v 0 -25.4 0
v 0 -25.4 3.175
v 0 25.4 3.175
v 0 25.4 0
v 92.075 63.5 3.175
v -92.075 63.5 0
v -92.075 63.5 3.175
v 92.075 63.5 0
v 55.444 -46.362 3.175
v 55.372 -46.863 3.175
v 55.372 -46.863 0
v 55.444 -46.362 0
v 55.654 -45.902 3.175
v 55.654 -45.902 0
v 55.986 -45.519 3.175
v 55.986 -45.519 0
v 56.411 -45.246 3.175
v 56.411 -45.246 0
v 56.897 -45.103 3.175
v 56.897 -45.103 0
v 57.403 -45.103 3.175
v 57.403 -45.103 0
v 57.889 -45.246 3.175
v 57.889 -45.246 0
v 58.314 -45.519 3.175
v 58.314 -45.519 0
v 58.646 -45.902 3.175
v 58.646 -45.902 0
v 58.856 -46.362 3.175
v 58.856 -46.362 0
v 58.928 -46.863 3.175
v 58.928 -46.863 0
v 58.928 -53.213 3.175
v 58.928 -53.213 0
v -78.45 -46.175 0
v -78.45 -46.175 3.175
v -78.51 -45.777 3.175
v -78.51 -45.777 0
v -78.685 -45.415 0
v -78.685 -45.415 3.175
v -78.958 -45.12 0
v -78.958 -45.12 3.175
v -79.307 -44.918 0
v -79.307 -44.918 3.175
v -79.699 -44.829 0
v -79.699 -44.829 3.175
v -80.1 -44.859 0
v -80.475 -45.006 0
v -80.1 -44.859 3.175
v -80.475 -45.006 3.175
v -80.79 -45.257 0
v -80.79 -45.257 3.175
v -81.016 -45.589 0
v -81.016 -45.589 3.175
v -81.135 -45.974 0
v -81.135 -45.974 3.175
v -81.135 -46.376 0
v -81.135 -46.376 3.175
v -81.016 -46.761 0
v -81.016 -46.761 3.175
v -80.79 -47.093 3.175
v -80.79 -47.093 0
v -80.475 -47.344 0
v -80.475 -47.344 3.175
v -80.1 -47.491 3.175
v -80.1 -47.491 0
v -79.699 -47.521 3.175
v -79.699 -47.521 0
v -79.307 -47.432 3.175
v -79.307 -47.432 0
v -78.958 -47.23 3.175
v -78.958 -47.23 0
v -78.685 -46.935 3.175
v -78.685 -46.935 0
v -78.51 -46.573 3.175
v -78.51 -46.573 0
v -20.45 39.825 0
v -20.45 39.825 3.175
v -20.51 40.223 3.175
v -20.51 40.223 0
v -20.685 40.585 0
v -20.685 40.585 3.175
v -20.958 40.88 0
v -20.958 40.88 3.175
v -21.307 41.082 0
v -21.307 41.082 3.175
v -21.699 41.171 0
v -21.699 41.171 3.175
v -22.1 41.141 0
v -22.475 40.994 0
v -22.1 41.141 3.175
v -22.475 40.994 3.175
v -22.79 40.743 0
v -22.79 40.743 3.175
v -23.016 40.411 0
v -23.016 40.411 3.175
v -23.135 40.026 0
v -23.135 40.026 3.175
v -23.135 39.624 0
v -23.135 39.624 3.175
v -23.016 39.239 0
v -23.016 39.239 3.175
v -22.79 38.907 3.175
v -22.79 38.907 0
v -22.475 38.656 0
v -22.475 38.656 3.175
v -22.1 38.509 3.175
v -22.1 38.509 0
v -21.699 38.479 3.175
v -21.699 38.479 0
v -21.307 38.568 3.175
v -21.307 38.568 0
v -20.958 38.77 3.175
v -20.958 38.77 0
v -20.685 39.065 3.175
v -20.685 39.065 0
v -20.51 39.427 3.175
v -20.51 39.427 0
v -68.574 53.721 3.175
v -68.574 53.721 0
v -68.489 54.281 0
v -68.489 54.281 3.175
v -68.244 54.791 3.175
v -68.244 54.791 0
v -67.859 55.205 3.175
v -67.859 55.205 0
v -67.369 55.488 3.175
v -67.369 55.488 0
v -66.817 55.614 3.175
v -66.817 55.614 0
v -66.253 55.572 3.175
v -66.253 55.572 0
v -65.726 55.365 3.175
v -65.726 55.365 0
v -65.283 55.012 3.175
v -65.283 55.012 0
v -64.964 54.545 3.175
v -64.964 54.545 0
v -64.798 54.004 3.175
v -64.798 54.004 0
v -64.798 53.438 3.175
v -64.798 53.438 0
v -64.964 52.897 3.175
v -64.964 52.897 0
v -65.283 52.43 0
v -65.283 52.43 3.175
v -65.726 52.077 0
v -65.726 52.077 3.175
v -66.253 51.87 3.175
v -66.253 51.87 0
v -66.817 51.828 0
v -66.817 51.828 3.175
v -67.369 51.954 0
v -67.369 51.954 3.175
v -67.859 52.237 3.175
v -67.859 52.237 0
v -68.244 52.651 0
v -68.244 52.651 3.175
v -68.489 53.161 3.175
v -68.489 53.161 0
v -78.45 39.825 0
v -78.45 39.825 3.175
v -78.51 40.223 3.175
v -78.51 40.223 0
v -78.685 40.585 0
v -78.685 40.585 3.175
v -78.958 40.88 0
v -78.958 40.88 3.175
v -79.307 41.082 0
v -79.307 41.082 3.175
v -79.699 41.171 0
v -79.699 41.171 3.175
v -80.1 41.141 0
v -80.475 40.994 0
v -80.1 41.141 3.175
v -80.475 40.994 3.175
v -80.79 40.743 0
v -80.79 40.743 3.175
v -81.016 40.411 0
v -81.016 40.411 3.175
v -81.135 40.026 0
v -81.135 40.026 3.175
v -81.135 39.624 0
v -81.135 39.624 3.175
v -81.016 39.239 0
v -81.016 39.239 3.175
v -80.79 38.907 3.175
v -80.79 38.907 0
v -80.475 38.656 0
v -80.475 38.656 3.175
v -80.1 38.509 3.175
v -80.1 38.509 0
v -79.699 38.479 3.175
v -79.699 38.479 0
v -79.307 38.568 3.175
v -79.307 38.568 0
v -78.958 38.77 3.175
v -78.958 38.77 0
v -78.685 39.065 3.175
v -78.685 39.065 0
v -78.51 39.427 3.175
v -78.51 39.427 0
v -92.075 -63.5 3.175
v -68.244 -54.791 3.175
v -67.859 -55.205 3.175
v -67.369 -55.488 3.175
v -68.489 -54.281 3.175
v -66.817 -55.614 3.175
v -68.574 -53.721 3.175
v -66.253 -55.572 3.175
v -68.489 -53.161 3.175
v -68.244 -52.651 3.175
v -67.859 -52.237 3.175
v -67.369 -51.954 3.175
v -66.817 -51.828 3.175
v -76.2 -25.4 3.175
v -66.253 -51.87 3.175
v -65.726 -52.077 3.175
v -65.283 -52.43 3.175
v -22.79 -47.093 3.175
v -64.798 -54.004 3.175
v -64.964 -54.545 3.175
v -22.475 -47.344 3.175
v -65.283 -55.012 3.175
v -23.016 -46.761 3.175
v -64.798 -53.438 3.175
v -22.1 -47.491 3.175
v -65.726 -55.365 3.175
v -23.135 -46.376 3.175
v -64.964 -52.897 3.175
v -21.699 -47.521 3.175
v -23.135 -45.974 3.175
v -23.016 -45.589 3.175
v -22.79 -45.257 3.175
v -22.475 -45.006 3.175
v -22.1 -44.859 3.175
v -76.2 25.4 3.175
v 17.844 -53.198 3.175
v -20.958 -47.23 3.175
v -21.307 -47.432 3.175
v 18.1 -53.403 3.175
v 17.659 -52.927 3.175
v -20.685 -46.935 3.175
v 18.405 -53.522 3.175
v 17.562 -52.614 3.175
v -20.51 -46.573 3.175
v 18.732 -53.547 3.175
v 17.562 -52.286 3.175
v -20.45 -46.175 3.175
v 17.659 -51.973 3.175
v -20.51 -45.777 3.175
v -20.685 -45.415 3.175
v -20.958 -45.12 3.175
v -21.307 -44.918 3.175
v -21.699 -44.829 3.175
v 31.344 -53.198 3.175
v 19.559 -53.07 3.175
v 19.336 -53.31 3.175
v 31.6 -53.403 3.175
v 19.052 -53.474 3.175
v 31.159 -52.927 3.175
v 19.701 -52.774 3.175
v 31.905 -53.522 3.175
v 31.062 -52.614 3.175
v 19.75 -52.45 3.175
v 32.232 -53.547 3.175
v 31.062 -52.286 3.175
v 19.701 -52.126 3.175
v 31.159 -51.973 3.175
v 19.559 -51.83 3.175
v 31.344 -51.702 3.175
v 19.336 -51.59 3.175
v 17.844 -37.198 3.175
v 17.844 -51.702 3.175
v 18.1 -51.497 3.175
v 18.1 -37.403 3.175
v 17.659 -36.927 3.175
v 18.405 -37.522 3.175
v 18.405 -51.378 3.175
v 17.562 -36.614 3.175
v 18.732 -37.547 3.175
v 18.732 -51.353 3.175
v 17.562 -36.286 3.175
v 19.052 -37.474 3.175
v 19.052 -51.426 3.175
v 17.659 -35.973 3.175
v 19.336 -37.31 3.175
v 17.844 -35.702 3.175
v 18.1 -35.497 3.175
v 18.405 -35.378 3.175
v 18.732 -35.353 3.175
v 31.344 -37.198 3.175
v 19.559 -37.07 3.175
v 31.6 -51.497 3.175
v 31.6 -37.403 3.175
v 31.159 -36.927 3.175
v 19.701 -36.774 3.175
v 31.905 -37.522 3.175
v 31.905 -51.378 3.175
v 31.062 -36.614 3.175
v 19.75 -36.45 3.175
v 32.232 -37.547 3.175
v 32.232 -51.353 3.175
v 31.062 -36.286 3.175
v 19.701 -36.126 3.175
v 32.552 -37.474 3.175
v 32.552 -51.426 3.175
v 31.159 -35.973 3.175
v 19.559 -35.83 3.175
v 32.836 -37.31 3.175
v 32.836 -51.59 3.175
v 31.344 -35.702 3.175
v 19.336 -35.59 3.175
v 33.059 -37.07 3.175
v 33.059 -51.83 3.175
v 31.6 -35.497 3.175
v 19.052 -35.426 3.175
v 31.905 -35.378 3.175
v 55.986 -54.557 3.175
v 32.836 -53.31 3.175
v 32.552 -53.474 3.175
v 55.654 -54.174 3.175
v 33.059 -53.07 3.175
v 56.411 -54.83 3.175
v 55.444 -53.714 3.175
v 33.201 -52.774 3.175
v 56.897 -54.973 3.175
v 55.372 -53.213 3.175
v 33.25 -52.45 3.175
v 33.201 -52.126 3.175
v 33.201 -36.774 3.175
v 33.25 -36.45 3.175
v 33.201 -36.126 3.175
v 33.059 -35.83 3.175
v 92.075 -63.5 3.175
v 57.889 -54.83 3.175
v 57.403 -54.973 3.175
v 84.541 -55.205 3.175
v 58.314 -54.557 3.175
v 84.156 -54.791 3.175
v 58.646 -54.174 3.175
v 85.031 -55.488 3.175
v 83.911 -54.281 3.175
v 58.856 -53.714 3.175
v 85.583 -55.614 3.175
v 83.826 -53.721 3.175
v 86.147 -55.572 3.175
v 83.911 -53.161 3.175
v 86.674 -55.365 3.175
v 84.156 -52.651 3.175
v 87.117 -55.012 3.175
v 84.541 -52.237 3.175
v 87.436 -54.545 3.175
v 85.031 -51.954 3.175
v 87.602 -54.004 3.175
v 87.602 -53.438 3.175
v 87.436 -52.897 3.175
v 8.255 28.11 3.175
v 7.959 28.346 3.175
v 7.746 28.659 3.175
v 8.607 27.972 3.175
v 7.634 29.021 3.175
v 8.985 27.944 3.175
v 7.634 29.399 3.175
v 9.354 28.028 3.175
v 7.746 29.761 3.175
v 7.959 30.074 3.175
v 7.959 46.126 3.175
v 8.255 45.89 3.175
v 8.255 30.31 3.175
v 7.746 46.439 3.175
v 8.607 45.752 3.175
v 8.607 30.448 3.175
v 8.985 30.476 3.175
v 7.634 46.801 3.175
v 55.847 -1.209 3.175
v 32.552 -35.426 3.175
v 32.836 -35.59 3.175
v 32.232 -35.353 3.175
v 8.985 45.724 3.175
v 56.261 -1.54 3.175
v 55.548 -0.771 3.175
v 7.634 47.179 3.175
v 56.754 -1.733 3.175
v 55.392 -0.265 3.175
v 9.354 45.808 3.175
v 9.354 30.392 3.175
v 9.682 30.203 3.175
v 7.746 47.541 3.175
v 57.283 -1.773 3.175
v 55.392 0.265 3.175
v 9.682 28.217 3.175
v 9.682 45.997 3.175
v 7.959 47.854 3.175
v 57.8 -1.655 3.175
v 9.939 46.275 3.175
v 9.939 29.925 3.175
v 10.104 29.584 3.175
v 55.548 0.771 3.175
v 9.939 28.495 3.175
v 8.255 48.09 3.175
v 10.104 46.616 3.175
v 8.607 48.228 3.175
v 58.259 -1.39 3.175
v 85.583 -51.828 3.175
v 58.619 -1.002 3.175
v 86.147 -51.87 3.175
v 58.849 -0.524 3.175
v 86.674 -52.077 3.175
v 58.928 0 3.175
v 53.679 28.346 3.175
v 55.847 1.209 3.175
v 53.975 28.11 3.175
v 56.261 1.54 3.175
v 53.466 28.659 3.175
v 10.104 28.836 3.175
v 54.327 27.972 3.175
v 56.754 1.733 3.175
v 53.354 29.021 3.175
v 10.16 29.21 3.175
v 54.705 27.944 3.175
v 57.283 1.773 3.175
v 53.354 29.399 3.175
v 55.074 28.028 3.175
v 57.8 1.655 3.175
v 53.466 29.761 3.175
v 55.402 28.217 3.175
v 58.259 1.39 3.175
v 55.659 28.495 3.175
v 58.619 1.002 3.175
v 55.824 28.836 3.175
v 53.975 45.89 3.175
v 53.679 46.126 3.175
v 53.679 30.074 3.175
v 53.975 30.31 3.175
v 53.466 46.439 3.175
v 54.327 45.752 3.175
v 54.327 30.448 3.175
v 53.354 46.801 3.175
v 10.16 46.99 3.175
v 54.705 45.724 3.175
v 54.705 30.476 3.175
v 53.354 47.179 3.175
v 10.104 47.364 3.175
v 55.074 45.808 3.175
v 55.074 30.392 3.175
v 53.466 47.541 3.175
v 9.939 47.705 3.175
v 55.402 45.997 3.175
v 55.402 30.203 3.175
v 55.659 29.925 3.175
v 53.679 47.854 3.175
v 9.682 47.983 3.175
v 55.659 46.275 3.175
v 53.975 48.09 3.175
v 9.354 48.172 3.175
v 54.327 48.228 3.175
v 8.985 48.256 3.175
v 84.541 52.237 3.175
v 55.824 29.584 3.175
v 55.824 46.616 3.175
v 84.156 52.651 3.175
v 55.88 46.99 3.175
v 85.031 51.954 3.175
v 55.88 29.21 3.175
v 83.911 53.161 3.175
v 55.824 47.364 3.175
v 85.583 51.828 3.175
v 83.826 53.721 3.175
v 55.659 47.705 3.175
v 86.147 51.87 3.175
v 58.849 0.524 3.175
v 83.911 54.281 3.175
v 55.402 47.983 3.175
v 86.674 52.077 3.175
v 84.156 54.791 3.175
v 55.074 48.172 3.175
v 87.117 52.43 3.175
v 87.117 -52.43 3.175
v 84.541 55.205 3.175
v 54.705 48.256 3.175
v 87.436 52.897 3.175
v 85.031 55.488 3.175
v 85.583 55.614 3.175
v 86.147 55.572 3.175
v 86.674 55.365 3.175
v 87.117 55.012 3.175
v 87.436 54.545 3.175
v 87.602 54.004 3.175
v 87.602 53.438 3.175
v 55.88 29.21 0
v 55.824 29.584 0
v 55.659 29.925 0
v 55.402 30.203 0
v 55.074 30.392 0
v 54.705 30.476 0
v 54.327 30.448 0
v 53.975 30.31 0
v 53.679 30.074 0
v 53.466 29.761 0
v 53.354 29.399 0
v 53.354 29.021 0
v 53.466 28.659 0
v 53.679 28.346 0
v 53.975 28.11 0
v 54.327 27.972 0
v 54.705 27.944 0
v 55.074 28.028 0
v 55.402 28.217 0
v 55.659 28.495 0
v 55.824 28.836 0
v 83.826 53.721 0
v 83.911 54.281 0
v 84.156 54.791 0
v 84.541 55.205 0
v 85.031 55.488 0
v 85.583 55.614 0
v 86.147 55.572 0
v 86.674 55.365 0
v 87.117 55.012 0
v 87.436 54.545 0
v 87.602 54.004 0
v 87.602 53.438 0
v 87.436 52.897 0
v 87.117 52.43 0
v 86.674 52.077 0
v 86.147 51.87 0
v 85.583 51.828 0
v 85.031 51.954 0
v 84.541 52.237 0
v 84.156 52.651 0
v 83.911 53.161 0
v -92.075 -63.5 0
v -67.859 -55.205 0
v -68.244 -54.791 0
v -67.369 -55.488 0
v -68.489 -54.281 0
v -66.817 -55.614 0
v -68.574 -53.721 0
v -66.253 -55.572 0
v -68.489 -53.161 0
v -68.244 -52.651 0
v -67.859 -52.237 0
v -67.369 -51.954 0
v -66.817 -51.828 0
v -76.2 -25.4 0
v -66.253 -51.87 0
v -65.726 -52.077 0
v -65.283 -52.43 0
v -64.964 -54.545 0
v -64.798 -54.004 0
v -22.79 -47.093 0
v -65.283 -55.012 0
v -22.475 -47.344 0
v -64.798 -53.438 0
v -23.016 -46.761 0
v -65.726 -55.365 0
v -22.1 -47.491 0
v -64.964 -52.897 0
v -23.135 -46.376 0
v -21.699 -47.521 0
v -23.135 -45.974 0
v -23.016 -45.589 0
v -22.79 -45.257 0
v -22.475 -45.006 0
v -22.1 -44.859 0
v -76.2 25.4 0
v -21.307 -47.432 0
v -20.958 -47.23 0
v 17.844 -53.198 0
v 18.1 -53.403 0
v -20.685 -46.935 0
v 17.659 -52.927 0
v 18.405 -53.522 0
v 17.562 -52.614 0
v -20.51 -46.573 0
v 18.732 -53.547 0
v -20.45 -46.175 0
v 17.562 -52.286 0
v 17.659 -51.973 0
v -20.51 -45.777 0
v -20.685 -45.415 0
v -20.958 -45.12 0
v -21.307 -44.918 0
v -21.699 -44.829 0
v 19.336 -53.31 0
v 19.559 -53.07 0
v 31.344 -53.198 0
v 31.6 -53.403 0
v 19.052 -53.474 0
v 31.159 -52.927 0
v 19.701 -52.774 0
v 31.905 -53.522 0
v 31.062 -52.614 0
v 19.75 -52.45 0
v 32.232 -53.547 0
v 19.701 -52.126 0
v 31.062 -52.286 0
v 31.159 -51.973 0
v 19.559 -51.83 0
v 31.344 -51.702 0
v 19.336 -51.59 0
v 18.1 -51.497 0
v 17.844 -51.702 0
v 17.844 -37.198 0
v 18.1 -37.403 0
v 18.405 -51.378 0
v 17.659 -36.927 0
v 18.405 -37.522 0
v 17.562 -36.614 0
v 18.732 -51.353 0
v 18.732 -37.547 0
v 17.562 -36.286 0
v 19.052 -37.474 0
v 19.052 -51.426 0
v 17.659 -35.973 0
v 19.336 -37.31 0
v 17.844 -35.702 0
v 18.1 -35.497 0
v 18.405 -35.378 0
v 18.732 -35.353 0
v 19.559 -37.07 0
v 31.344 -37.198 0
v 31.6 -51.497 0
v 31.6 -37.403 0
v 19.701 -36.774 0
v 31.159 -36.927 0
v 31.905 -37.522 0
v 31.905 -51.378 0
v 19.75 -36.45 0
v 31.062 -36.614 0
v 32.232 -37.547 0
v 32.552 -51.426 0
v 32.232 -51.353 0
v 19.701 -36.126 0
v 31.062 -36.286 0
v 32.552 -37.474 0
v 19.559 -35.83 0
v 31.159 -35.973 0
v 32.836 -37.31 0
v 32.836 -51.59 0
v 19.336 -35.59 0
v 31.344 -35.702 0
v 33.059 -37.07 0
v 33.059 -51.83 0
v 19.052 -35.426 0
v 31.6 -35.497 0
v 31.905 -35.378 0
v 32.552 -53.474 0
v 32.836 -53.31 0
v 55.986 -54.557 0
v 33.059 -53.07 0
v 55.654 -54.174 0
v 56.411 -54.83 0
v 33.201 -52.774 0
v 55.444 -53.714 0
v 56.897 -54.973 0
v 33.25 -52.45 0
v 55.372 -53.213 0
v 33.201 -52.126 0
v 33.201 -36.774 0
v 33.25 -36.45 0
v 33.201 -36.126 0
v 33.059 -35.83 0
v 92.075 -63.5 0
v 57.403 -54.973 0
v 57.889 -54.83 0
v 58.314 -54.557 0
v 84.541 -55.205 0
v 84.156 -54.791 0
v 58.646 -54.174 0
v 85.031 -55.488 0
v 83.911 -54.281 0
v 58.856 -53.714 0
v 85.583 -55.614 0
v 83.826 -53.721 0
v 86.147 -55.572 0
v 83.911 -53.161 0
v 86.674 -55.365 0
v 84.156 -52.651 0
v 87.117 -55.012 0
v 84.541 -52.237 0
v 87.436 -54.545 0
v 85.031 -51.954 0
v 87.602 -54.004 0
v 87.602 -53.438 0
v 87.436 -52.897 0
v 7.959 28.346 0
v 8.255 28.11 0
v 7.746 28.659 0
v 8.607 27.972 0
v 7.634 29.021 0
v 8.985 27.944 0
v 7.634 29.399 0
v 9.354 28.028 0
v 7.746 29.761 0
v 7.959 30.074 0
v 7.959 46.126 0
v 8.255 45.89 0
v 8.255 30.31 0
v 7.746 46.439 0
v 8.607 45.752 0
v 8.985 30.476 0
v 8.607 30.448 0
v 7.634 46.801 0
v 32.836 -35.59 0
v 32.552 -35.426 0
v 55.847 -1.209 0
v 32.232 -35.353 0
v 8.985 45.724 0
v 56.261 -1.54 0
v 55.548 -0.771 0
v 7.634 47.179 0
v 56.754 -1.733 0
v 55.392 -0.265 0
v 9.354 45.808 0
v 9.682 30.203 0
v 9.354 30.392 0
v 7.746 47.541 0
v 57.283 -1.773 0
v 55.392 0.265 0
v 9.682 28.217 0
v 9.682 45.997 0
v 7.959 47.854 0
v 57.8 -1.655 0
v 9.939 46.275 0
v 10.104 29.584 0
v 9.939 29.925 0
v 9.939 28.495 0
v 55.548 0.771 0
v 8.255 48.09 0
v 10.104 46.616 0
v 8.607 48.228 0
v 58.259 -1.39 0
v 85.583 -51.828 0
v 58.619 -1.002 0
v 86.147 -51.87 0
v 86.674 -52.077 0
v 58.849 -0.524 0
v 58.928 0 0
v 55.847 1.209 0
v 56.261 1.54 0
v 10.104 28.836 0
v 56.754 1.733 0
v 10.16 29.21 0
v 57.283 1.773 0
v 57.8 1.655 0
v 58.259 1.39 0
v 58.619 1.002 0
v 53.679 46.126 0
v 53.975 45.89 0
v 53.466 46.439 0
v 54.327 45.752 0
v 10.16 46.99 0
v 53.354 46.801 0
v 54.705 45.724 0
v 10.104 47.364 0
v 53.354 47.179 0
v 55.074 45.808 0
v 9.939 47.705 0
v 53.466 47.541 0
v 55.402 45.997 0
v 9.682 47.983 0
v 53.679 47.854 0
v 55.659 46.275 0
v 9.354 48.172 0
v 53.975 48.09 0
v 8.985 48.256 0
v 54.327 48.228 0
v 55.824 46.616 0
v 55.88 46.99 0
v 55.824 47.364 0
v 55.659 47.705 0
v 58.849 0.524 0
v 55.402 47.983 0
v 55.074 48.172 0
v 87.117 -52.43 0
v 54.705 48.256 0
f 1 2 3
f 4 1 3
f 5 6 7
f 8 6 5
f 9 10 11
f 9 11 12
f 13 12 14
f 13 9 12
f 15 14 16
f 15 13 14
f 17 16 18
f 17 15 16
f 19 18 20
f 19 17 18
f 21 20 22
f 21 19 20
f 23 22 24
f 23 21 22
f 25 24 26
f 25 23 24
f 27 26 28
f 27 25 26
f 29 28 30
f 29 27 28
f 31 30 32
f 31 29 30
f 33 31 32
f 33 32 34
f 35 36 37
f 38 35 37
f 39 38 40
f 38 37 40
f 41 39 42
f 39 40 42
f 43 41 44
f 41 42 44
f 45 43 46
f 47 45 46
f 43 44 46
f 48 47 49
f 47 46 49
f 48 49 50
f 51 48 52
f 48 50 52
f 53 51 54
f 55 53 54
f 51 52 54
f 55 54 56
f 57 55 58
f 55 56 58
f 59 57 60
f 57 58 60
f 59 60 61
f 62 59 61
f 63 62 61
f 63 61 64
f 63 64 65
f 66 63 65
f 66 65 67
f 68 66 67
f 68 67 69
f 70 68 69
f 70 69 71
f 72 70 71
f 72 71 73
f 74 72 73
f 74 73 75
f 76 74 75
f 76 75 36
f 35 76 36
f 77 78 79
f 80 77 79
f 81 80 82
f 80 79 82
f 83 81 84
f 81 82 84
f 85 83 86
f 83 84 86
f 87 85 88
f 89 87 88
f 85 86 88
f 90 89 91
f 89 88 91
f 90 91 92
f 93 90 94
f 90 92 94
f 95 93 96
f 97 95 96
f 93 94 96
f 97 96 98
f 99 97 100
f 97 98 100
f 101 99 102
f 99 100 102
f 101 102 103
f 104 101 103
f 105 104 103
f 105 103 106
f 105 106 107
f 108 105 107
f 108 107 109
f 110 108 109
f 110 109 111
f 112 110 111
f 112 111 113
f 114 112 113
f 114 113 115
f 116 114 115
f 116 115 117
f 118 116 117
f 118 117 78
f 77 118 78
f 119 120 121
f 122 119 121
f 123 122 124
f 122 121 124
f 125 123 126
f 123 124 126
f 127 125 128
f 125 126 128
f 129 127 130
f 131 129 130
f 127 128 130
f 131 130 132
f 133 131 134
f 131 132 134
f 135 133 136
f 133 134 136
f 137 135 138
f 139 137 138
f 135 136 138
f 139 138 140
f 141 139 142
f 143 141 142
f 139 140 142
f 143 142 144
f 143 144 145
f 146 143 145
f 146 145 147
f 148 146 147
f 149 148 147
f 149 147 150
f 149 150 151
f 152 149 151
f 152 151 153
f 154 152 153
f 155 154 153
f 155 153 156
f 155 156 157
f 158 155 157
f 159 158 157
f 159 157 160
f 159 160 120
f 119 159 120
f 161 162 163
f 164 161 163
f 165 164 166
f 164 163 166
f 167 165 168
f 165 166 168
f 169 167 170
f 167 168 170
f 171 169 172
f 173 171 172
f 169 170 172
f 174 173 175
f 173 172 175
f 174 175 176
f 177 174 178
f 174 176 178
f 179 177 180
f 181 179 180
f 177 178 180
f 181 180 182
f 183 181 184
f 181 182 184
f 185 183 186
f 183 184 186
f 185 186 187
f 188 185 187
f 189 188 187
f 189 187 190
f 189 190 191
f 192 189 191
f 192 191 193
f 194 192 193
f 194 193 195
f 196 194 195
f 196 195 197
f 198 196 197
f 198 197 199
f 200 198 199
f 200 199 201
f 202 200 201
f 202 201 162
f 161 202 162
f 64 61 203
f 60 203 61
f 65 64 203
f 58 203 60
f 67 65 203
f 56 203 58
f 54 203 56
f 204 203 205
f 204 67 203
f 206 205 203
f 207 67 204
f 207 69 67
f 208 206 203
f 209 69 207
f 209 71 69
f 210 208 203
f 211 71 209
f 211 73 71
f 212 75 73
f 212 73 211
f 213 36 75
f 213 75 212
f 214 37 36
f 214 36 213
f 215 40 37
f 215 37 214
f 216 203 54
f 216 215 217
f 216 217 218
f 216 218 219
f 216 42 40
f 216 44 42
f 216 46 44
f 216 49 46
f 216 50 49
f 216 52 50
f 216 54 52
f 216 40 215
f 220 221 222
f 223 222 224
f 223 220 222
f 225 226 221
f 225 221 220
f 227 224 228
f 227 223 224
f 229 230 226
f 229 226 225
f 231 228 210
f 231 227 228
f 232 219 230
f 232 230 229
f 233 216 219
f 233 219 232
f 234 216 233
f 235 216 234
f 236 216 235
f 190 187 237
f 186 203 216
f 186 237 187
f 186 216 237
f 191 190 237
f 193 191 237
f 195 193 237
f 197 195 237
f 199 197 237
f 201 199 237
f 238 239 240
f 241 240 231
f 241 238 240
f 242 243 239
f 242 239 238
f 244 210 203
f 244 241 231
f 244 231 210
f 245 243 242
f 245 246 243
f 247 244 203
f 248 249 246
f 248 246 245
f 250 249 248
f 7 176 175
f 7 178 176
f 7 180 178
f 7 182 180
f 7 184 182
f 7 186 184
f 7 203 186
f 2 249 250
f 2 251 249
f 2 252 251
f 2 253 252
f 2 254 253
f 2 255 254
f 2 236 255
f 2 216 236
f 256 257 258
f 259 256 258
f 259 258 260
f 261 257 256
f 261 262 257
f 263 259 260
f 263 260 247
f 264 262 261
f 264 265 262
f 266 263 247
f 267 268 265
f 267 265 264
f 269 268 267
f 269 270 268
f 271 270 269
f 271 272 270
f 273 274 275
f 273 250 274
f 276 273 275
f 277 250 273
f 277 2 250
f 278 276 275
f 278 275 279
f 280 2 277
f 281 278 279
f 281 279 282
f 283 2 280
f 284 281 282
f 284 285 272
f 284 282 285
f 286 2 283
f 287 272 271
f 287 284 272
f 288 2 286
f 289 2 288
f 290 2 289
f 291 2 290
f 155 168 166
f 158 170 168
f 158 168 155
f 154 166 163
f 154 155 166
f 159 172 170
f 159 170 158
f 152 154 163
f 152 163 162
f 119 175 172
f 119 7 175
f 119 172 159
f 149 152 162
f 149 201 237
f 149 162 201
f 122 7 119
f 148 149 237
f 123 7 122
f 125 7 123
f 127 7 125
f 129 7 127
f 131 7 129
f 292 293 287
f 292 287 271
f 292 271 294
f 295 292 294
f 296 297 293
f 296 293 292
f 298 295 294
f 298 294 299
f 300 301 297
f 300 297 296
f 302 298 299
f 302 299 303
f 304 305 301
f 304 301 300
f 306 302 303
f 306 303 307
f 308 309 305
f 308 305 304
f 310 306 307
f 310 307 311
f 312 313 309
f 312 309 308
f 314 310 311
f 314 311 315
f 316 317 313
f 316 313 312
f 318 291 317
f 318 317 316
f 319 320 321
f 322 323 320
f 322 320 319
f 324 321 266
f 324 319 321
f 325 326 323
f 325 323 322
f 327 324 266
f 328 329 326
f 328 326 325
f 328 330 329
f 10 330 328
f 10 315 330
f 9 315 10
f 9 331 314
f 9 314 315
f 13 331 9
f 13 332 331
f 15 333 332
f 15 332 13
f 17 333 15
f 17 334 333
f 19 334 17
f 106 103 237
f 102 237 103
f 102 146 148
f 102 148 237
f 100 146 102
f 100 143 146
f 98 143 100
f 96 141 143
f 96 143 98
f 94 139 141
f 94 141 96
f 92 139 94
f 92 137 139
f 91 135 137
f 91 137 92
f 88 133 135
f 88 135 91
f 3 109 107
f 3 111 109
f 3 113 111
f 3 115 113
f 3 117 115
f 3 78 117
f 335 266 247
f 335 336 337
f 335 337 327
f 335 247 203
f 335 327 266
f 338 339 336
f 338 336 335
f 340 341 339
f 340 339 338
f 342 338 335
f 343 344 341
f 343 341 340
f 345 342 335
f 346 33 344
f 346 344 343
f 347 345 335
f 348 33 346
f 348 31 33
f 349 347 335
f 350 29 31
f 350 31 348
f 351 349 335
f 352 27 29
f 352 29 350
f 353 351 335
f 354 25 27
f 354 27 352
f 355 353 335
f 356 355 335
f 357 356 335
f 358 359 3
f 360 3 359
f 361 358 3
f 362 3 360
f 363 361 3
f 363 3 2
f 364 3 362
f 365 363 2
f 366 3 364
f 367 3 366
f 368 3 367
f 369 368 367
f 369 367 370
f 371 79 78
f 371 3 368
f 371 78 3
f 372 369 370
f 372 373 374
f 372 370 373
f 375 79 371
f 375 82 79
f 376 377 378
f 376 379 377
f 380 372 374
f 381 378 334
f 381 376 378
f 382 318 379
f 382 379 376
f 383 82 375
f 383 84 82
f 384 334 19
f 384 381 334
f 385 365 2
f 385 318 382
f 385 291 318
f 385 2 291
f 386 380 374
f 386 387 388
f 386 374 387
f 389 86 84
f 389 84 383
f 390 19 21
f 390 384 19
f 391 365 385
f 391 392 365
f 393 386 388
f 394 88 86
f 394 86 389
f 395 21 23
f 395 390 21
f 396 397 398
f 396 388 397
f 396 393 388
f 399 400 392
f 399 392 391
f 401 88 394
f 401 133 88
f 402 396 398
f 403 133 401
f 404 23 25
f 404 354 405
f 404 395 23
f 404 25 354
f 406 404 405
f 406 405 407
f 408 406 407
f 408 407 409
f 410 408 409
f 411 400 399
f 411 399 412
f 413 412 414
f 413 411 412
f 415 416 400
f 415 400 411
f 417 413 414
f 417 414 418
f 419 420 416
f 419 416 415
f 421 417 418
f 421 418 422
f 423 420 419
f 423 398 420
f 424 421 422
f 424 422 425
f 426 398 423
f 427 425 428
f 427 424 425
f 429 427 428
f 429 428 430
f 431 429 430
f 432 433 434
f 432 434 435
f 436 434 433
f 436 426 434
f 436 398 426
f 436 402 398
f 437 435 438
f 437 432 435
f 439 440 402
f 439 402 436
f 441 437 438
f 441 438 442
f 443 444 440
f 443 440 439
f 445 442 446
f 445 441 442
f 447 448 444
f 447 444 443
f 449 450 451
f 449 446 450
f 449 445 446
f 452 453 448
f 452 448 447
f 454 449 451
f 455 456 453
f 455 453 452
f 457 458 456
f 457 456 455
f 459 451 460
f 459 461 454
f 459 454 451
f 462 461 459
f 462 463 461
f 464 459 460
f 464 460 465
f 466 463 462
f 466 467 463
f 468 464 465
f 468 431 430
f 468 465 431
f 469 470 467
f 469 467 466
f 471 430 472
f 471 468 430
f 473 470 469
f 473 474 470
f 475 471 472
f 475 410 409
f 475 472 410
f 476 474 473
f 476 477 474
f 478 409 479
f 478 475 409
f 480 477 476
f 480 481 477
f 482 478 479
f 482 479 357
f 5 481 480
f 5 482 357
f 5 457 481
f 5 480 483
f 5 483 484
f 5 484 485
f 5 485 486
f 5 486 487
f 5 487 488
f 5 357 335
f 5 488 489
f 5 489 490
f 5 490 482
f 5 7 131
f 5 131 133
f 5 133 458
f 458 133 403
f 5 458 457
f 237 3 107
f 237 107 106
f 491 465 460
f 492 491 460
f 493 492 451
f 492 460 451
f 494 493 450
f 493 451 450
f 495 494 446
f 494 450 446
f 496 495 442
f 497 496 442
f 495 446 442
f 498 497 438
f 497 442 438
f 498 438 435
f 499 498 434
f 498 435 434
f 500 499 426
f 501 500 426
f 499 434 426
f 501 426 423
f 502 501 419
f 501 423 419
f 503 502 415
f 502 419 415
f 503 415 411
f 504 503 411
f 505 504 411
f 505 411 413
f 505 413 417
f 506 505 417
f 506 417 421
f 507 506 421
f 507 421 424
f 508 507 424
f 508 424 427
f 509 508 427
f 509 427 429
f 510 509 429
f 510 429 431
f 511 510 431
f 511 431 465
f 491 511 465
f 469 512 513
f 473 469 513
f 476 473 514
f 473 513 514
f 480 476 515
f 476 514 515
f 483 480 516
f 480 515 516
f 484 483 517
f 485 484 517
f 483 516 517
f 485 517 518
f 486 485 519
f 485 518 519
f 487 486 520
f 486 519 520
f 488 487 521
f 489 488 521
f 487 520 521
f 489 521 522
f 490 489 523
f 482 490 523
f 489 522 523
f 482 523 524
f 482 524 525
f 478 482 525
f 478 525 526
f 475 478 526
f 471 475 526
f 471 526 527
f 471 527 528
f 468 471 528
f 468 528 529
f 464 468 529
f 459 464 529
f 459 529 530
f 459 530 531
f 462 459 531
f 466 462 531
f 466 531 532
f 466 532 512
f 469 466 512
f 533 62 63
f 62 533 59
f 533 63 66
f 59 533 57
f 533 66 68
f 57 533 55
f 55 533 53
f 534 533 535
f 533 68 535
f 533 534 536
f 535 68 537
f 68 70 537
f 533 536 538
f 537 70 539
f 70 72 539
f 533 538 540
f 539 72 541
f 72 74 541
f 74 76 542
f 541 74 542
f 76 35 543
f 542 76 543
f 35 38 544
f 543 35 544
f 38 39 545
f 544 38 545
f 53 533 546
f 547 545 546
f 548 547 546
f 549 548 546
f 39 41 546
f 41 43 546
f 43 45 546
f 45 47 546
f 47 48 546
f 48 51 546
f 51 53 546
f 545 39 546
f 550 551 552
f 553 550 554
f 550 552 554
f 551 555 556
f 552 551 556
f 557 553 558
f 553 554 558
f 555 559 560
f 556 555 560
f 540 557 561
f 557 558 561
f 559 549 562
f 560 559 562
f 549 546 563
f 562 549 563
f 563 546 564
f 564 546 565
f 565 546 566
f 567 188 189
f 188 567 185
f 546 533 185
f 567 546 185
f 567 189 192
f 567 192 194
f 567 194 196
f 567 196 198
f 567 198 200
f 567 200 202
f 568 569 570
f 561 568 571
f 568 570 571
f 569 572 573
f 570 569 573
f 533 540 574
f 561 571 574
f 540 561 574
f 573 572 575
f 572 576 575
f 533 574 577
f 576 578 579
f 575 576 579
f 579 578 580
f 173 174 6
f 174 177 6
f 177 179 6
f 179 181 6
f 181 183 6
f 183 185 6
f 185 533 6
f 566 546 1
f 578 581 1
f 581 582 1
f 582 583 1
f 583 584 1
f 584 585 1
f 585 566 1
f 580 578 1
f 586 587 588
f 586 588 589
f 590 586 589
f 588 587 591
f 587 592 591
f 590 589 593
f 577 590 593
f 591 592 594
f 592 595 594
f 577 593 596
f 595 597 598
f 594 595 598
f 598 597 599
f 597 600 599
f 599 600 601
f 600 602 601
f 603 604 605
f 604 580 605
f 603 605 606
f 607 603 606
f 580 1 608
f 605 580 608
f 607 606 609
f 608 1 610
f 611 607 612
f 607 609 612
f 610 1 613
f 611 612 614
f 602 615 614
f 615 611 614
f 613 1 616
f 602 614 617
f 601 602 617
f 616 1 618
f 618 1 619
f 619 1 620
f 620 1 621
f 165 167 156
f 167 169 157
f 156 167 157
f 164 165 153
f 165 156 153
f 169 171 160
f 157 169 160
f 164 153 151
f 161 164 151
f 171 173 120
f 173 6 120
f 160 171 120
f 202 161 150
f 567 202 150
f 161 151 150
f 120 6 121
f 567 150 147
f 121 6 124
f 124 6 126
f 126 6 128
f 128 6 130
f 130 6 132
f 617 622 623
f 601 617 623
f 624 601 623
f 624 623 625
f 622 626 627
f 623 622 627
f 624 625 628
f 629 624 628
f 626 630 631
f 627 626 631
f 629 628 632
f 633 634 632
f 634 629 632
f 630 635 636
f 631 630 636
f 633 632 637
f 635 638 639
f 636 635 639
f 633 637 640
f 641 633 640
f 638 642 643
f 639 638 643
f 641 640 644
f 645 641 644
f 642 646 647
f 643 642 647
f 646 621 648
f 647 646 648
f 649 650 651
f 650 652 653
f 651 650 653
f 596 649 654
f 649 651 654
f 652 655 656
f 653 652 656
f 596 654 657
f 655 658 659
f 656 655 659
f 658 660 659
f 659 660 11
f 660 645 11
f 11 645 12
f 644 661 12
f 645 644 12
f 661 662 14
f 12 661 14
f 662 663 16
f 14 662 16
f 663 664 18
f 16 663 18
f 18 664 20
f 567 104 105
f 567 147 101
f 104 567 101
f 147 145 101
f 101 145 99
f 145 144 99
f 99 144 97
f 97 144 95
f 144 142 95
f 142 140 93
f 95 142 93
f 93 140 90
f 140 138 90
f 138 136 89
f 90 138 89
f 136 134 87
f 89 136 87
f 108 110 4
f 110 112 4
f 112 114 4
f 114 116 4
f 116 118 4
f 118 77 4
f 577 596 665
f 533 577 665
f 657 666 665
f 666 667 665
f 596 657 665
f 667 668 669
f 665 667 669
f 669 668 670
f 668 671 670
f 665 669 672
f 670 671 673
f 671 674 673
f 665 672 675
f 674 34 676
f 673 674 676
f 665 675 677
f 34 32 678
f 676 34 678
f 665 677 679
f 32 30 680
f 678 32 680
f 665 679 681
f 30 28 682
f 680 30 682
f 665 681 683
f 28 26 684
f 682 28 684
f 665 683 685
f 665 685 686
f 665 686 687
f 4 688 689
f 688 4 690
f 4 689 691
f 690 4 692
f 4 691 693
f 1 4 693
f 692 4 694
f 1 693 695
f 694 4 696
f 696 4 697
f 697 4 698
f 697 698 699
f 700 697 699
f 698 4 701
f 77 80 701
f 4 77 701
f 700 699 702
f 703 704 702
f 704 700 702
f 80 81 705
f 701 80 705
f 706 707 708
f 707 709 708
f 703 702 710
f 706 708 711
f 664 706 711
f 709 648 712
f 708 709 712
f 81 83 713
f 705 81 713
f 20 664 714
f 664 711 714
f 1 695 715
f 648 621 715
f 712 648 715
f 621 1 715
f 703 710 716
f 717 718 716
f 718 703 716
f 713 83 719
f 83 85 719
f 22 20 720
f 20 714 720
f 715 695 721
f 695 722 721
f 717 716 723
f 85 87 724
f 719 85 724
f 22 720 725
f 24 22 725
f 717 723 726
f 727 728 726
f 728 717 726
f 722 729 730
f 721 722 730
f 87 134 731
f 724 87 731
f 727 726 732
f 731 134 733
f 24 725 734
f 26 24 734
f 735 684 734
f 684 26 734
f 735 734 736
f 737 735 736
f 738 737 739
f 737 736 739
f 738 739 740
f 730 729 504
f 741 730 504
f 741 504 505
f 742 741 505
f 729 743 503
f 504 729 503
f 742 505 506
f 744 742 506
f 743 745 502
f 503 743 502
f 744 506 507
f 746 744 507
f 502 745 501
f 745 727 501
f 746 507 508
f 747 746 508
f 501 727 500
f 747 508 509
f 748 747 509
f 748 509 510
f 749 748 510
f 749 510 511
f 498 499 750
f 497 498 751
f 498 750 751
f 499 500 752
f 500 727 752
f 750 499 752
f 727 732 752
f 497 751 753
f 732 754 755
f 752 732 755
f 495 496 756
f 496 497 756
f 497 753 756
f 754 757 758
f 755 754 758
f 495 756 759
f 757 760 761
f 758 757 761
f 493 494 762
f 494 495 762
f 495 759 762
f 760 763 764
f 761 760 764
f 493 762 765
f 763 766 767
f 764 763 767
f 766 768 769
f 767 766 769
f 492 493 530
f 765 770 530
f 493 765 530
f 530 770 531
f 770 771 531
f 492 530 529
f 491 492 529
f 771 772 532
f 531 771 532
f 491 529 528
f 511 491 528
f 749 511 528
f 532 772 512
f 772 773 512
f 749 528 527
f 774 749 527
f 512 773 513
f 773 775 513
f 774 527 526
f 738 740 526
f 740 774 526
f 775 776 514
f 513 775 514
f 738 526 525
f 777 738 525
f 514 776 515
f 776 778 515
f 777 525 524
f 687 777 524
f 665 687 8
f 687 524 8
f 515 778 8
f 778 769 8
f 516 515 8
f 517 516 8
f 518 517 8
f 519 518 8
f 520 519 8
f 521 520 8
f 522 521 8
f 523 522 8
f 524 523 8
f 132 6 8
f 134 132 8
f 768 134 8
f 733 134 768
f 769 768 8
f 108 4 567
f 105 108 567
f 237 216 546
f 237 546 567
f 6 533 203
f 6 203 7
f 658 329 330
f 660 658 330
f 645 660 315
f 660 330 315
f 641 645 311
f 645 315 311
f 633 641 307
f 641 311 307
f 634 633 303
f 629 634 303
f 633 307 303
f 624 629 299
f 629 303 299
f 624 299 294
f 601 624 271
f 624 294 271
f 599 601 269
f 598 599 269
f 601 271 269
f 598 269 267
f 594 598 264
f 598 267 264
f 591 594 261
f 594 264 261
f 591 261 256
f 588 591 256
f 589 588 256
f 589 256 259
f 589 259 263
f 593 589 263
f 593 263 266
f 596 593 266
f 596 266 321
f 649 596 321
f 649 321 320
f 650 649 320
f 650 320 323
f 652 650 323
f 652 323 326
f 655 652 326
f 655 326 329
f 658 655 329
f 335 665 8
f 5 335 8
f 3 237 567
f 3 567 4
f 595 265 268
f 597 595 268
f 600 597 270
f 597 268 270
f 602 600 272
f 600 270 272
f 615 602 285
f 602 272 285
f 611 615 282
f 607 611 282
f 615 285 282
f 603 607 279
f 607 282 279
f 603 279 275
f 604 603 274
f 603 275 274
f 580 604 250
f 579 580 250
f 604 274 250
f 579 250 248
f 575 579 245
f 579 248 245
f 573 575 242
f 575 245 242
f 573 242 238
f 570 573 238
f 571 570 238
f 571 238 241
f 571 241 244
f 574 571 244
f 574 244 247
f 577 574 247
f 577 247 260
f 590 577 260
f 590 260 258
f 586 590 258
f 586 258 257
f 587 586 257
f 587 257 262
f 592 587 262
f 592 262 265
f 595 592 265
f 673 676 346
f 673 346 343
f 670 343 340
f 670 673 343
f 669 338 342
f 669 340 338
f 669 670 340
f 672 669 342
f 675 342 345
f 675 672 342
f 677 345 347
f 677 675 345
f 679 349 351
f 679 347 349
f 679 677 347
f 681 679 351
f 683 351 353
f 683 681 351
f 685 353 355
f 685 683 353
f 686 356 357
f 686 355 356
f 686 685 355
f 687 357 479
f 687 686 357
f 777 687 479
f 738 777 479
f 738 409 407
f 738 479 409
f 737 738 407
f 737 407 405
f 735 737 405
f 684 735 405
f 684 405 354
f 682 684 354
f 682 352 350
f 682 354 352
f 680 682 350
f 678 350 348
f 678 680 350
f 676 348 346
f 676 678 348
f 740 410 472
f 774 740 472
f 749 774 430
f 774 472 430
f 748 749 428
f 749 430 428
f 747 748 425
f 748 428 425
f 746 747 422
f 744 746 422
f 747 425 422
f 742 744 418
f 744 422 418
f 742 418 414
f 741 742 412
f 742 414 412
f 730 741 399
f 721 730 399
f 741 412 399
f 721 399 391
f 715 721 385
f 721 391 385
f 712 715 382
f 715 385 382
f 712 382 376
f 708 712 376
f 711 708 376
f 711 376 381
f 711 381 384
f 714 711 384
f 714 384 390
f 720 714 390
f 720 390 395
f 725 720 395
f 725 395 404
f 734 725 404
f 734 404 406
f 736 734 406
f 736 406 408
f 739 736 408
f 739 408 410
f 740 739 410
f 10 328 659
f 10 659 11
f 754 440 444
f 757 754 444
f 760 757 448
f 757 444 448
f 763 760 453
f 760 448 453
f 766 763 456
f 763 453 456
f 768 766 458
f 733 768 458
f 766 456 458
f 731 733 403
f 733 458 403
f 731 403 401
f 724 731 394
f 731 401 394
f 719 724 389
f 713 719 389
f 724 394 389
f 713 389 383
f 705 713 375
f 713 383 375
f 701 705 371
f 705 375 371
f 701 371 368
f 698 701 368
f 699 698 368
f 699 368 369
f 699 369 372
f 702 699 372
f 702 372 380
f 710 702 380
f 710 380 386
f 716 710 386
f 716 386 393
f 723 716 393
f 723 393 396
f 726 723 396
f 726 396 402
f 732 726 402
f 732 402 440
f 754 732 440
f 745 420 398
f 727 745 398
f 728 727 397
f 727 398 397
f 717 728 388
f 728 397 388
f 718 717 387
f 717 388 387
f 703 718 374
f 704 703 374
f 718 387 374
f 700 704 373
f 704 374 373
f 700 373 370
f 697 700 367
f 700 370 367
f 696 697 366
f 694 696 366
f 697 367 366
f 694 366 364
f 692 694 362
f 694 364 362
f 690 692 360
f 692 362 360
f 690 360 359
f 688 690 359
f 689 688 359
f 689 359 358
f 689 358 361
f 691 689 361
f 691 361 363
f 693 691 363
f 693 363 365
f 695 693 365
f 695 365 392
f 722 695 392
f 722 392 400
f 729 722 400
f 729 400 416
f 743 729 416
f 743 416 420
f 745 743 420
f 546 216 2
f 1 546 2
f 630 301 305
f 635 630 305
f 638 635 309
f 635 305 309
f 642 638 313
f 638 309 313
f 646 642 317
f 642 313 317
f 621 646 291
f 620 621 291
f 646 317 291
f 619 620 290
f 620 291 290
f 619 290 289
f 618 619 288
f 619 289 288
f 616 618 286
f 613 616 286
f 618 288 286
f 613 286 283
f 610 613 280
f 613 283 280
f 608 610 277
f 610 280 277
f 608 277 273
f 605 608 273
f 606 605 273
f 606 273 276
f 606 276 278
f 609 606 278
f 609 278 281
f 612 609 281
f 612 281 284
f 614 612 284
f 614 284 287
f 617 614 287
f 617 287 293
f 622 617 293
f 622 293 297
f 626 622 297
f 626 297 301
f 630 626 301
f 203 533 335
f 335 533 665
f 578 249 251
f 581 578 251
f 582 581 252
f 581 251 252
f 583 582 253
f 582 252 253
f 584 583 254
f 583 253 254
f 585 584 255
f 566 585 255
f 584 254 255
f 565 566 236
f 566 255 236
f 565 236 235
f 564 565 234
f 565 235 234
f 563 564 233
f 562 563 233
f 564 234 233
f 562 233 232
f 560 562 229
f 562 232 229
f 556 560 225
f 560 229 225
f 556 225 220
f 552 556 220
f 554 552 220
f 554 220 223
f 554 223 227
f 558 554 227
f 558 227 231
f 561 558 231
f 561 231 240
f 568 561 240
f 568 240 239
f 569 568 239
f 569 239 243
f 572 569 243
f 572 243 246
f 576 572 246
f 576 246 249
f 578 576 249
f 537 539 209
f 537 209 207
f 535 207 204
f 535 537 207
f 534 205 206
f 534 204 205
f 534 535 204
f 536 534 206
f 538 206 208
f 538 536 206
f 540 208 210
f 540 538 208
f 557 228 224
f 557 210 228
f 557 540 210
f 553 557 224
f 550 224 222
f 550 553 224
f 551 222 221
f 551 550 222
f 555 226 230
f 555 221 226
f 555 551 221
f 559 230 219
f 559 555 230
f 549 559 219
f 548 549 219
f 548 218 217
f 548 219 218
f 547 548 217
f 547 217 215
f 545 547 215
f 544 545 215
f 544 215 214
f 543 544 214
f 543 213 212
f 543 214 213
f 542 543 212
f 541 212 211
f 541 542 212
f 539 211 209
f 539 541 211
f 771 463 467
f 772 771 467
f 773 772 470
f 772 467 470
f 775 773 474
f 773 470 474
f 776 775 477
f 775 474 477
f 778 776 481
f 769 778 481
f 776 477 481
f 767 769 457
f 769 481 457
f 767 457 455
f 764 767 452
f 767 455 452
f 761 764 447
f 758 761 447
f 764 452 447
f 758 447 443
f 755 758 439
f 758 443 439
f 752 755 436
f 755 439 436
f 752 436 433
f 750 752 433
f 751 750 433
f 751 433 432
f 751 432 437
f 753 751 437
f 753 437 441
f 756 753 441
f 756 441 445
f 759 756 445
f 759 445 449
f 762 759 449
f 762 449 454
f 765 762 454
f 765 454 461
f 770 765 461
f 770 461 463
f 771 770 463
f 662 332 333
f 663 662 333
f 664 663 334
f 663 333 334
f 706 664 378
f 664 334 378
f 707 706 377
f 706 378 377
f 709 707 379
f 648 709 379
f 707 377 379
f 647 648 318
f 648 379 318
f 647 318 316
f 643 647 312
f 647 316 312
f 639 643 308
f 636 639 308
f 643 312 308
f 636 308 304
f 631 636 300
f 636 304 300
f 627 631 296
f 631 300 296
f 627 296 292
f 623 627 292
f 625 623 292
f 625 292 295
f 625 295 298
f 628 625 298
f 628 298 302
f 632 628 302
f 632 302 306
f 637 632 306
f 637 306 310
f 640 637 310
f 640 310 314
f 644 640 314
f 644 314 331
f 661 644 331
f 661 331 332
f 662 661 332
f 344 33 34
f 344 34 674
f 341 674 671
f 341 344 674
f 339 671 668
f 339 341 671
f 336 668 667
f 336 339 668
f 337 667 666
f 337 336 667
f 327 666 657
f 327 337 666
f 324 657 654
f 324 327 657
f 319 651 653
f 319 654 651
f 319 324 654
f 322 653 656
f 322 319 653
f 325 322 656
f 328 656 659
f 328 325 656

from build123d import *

# Parameters (mm, degrees)
SKETCH1_W             = 184.15
SKETCH1_H             = 127
BOSS_EXTRUDE1_DEPTH   = 3.175
SKETCH3_R             = 1.35
CUT_EXTRUDE1_DEPTH    = 112.893414686
F_6_CLEARANCE_HOLE1_D = 3.7973
SKETCH9_R             = 1.0999978
CUT_EXTRUDE2_DEPTH    = 112.893414686
SKETCH10_R            = 1.27
CUT_EXTRUDE3_DEPTH    = 112.893414686
SKETCH11_R            = 1.778
CUT_EXTRUDE4_DEPTH    = 112.893414686
SKETCH12_W            = 76.2
SKETCH12_H            = 50.8
CUT_EXTRUDE5_DEPTH    = 112.893414686


with BuildPart() as part:
    # Sketch1 → Boss-Extrude1 (new body)
    with BuildSketch(Plane.XY):
        Rectangle(SKETCH1_W, SKETCH1_H)
    extrude(amount=BOSS_EXTRUDE1_DEPTH)

    # Sketch3 → Cut-Extrude1 (cut, through all)
    with BuildSketch(Plane.XY.offset(3.175)):
        with Locations((-79.800000039, 39.825)):
            Circle(SKETCH3_R)
        with Locations((-21.799999961, 39.825)):
            Circle(SKETCH3_R)
        with Locations((-79.800000039, -46.175)):
            Circle(SKETCH3_R)
        with Locations((-21.799999961, -46.175)):
            Circle(SKETCH3_R)
    extrude(amount=-CUT_EXTRUDE1_DEPTH, mode=Mode.SUBTRACT)

    # #6 Clearance Hole1 (through all)
    with Locations(Plane.XY.offset(3.175)):
        with Locations((-66.675, 53.721), (85.725, 53.721)):
            f_6_clearance_hole1 = Hole(F_6_CLEARANCE_HOLE1_D / 2)

    # Mirror3: #6 Clearance Hole1 across plane
    add(f_6_clearance_hole1.mirror(Plane.ZX), mode=Mode.SUBTRACT)

    # Sketch9 → Cut-Extrude2 (cut, through all)
    with BuildSketch(Plane.XY.offset(3.175)):
        with Locations((18.650000038, -36.45)):
            Circle(SKETCH9_R)
        with Locations((32.149999962, -36.45)):
            Circle(SKETCH9_R)
        with Locations((32.149999962, -52.45)):
            Circle(SKETCH9_R)
        with Locations((18.650000038, -52.45)):
            Circle(SKETCH9_R)
    extrude(amount=-CUT_EXTRUDE2_DEPTH, mode=Mode.SUBTRACT)

    # Sketch10 → Cut-Extrude3 (cut, through all)
    with BuildSketch(Plane.XY.offset(3.175)):
        with Locations((54.61, 46.99)):
            Circle(SKETCH10_R)
        with Locations((54.61, 29.21)):
            Circle(SKETCH10_R)
        with Locations((8.89, 29.21)):
            Circle(SKETCH10_R)
        with Locations((8.89, 46.99)):
            Circle(SKETCH10_R)
    extrude(amount=-CUT_EXTRUDE3_DEPTH, mode=Mode.SUBTRACT)

    # Sketch11 → Cut-Extrude4 (cut, through all)
    with BuildSketch(Plane.XY.offset(3.175)):
        with Locations((57.15, 0)):
            Circle(SKETCH11_R)
        with BuildLine():
            Line((58.928, -46.863), (58.928, -53.213))
            ThreePointArc((58.928, -53.213), (57.15, -54.991), (55.372, -53.213))
            Line((55.372, -53.213), (55.372, -46.863))
            ThreePointArc((55.372, -46.863), (57.15, -45.085), (58.928, -46.863))
        make_face()
    extrude(amount=-CUT_EXTRUDE4_DEPTH, mode=Mode.SUBTRACT)

    # Sketch12 → Cut-Extrude5 (cut, through all)
    with BuildSketch(Plane.XY.offset(3.175)):
        with Locations((-38.1, 0)):
            Rectangle(SKETCH12_W, SKETCH12_H)
    extrude(amount=-CUT_EXTRUDE5_DEPTH, mode=Mode.SUBTRACT)


solid = part.part
